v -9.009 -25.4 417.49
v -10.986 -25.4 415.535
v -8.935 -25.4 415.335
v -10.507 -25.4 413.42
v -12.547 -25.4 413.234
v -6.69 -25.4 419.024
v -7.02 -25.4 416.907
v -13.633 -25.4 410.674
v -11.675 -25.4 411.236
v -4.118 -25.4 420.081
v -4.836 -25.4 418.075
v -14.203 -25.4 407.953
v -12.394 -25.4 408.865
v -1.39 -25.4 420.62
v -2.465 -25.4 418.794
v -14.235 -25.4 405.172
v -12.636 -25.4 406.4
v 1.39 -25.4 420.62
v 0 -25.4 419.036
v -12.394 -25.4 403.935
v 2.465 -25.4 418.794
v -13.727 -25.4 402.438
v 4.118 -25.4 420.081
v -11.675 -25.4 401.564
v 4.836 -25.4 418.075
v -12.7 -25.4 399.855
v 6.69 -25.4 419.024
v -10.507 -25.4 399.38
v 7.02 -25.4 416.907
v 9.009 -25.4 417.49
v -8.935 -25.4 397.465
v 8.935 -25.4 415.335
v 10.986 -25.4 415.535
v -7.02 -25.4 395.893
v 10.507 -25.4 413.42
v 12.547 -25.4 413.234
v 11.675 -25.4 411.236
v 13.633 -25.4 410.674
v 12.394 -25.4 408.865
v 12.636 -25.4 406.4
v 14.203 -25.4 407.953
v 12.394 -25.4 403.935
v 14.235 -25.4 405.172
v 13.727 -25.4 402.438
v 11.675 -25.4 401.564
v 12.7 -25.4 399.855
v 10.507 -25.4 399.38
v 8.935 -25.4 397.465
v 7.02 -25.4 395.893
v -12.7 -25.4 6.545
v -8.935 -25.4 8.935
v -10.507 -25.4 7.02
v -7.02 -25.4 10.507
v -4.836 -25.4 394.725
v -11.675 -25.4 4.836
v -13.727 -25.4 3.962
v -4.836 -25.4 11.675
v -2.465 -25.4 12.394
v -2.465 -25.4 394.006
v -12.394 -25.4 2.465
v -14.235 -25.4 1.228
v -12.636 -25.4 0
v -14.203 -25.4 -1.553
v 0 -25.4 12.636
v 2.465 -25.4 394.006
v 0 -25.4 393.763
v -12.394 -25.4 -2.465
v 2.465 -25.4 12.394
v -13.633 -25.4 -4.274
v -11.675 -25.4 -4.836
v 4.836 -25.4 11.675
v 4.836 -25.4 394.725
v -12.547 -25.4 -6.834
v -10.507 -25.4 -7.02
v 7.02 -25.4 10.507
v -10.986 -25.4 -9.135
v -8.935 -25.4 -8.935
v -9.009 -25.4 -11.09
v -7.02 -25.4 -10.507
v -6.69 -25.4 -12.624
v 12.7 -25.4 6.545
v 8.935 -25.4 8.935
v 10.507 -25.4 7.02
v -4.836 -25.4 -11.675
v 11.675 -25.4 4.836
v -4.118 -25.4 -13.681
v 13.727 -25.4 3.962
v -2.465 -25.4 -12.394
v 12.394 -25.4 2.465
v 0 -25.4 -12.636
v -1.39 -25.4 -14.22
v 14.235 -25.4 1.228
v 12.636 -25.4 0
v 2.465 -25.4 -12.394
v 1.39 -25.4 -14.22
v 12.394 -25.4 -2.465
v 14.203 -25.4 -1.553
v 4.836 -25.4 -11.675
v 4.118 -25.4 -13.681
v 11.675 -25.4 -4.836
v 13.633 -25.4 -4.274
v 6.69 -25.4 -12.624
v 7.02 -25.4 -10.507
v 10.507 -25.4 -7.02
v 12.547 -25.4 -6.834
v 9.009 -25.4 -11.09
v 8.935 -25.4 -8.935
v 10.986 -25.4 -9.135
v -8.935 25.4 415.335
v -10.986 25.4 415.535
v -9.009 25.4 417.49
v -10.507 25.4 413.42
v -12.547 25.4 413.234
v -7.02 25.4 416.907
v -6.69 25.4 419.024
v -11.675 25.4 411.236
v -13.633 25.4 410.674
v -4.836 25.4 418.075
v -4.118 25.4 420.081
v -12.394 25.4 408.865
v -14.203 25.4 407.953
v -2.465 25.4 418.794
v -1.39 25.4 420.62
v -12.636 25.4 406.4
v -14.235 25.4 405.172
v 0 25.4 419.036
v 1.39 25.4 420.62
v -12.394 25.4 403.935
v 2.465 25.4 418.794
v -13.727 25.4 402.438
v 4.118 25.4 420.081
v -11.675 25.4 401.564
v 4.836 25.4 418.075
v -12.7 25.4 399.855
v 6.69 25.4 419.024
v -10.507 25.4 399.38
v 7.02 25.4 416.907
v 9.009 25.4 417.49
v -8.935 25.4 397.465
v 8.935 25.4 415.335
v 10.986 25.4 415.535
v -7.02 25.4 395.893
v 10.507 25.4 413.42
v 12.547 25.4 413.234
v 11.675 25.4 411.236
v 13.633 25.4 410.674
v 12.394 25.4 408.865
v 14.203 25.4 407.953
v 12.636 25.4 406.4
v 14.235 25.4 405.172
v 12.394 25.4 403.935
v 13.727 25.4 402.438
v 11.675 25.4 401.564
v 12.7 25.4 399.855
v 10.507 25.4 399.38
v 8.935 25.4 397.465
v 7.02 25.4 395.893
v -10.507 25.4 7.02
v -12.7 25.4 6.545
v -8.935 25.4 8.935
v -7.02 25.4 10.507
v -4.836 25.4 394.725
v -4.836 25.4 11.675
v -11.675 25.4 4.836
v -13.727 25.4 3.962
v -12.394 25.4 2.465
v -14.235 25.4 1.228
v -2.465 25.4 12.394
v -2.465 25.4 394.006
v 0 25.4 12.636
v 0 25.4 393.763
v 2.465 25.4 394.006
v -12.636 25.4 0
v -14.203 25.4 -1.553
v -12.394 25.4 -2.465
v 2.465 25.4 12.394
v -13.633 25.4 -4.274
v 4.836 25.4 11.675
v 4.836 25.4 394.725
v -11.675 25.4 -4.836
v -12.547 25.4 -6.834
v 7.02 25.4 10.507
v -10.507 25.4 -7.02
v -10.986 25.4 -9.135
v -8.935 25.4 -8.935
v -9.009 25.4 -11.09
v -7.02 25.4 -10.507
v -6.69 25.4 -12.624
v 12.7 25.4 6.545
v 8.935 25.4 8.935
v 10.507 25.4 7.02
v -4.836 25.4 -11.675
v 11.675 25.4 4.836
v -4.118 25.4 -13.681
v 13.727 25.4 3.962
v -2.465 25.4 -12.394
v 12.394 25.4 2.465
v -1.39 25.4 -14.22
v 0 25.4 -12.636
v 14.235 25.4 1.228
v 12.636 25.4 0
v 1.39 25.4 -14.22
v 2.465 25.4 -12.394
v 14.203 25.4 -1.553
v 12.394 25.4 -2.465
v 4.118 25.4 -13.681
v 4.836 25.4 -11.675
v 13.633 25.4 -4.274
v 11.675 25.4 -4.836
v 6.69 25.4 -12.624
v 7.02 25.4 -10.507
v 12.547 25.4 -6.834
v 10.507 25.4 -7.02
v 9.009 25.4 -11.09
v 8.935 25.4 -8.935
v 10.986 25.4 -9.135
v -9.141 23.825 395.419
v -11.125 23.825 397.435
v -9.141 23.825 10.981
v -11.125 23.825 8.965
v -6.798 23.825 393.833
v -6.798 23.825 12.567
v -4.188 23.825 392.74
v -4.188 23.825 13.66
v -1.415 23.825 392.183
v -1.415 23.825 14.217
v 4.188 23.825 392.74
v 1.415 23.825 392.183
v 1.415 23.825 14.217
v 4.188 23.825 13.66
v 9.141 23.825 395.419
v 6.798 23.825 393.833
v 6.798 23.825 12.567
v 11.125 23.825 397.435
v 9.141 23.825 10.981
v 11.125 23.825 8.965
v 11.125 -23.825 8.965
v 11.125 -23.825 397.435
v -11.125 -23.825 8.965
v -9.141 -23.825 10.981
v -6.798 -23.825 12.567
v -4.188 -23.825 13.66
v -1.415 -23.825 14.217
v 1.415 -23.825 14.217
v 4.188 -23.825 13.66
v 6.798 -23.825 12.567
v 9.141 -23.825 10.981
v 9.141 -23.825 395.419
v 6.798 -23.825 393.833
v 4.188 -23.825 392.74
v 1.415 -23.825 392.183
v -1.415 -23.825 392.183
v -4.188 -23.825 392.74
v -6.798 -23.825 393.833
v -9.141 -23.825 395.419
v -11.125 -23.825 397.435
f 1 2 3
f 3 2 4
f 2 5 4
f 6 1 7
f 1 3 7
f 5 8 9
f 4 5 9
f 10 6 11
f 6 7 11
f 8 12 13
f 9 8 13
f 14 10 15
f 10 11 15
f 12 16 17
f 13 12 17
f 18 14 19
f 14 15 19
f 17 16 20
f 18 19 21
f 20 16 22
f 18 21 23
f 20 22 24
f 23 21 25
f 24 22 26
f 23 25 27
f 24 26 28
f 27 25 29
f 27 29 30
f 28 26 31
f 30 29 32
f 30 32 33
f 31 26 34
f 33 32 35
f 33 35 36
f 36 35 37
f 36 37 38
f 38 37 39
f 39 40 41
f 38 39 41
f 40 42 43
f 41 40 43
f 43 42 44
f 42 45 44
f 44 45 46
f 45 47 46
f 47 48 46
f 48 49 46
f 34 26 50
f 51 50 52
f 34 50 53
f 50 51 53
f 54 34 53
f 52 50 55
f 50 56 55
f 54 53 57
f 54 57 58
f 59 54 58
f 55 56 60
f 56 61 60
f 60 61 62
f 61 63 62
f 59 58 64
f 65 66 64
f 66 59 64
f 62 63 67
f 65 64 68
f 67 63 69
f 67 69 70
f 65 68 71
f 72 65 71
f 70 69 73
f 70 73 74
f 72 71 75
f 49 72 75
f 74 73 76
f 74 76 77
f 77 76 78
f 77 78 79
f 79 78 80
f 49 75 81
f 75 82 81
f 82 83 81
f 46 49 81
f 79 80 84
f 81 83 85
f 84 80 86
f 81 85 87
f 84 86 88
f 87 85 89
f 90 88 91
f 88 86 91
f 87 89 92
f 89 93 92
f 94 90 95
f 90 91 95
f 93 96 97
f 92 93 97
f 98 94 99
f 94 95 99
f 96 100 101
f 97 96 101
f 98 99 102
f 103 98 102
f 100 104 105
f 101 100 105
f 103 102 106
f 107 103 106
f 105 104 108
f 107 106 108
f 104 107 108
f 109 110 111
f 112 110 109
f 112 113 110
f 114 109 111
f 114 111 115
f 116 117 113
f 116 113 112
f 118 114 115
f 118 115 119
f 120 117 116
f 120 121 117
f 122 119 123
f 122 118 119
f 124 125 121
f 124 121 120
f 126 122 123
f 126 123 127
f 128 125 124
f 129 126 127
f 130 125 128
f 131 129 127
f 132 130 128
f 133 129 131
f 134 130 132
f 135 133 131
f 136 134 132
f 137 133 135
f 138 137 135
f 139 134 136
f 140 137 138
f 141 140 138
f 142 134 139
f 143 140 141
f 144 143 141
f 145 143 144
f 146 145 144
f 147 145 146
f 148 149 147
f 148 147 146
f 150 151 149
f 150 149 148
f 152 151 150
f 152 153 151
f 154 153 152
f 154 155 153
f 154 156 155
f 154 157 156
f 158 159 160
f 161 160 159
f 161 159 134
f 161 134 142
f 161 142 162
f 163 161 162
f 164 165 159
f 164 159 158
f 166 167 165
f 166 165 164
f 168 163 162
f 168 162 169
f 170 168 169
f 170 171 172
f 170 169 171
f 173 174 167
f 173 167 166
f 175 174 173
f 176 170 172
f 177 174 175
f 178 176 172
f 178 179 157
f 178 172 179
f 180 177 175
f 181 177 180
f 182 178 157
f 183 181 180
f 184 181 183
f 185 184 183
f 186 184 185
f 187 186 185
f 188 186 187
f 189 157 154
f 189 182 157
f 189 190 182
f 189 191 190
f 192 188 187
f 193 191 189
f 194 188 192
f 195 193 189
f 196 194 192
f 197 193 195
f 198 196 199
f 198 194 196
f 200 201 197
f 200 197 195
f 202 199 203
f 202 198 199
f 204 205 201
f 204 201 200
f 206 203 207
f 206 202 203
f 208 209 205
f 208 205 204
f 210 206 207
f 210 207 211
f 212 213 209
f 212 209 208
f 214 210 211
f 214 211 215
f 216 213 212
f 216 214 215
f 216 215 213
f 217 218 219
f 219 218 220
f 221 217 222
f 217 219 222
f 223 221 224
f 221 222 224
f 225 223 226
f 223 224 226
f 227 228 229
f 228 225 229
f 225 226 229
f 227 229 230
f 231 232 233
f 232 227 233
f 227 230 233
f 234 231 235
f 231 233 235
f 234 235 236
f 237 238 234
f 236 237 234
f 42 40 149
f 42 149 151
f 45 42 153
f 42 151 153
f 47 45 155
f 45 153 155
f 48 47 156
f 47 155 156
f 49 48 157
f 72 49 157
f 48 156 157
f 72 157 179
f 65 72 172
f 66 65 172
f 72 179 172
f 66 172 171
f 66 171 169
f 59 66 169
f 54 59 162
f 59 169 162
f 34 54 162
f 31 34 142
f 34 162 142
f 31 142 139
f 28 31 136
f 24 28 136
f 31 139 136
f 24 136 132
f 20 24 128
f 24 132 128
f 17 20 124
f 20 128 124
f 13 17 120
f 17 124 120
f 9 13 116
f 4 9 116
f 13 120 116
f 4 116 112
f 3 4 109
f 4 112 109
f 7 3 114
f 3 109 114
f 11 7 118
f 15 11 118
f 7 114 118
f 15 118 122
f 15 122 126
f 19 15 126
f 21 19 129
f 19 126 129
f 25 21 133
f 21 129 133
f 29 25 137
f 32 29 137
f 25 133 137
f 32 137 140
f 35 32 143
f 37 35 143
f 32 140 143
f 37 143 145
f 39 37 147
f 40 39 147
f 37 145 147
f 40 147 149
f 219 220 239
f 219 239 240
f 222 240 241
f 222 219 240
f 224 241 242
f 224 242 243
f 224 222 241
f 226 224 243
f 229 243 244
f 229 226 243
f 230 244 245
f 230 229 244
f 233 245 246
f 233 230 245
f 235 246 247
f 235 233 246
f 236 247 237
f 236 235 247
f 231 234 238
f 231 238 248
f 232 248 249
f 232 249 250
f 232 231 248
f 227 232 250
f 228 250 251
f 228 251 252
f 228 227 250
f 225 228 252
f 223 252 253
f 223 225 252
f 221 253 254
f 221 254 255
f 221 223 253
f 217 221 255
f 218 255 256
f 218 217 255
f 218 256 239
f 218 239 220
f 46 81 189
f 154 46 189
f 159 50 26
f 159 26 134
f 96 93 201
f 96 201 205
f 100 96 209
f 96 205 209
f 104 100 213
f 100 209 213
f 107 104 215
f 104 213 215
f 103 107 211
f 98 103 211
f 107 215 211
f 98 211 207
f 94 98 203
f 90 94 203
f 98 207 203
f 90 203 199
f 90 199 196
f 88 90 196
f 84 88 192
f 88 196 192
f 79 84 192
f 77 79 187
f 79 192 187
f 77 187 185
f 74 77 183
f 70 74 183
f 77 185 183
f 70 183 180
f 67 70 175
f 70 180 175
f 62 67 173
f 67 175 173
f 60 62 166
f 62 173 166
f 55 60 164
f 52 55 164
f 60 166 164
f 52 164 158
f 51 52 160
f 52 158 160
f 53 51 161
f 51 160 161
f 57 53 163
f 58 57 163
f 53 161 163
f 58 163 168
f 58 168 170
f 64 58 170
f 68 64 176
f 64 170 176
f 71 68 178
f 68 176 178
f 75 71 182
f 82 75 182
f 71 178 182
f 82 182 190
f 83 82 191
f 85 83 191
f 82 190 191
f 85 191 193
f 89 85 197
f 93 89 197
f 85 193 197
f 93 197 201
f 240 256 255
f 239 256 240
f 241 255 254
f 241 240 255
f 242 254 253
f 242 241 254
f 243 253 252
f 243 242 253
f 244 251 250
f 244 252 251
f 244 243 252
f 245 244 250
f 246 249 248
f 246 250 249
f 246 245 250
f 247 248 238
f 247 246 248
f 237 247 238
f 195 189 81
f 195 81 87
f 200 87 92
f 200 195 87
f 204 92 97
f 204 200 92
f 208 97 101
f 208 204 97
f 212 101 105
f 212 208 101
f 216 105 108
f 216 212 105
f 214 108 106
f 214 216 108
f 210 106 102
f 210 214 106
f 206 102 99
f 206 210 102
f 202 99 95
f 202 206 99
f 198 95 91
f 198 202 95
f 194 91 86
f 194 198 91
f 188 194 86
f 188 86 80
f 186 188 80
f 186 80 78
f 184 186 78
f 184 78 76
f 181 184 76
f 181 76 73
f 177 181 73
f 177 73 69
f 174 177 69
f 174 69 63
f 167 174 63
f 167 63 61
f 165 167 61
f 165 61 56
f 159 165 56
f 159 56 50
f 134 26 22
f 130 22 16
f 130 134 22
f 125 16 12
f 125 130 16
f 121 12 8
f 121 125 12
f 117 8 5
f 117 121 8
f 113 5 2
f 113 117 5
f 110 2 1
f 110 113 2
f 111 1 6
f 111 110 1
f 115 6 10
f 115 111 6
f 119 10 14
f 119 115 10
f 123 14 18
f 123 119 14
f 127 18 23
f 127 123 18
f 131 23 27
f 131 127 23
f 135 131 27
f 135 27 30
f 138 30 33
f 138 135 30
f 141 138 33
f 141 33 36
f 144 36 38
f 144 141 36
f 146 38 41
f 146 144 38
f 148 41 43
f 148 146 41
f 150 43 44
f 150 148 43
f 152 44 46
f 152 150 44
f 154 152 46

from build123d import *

# Parameters (mm, degrees)
SKETCH1_W           = 25.4
SKETCH1_H           = 50.8
SKETCH1_W_2         = 22.2504
SKETCH1_H_2         = 47.6504
BOSS_EXTRUDE1_DEPTH = 406.4
SKETCH2_R           = 14.2875
CUT_EXTRUDE1_DEPTH  = 410.759551445
SKETCH3_R           = 14.2875
SKETCH3_R_2         = 12.6365
BOSS_EXTRUDE2_DEPTH = 50.8


with BuildPart() as part:
    # Sketch1 → Boss-Extrude1 (new body)
    with BuildSketch(Plane.XY):
        Rectangle(SKETCH1_W, SKETCH1_H)
        Rectangle(SKETCH1_W_2, SKETCH1_H_2, mode=Mode.SUBTRACT)
    extrude(amount=BOSS_EXTRUDE1_DEPTH)

    # Sketch2 → Cut-Extrude1 (cut, through all)
    with BuildSketch(Plane(origin=(0, 25.4, 0), x_dir=(1, 0, 0), z_dir=(0, 1, 0))):
        Circle(SKETCH2_R)
        with Locations((0, -406.4)):
            Circle(SKETCH2_R)
    extrude(amount=-CUT_EXTRUDE1_DEPTH, mode=Mode.SUBTRACT)

    # Sketch3 → Boss-Extrude2 (add)
    # profile 1 of 2: a face of its own
    with BuildSketch(Plane(origin=(0, 25.4, 0), x_dir=(1, 0, 0), z_dir=(0, 1, 0))):
        Circle(SKETCH3_R)
        Circle(SKETCH3_R_2, mode=Mode.SUBTRACT)
    # profile 2 of 2: a face of its own
    with BuildSketch(Plane(origin=(0, 25.4, 0), x_dir=(1, 0, 0), z_dir=(0, 1, 0))):
        with Locations((0, -406.4)):
            Circle(SKETCH3_R)
        with Locations((0, -406.4)):
            Circle(SKETCH3_R_2, mode=Mode.SUBTRACT)
    extrude(amount=-BOSS_EXTRUDE2_DEPTH)


solid = part.part
